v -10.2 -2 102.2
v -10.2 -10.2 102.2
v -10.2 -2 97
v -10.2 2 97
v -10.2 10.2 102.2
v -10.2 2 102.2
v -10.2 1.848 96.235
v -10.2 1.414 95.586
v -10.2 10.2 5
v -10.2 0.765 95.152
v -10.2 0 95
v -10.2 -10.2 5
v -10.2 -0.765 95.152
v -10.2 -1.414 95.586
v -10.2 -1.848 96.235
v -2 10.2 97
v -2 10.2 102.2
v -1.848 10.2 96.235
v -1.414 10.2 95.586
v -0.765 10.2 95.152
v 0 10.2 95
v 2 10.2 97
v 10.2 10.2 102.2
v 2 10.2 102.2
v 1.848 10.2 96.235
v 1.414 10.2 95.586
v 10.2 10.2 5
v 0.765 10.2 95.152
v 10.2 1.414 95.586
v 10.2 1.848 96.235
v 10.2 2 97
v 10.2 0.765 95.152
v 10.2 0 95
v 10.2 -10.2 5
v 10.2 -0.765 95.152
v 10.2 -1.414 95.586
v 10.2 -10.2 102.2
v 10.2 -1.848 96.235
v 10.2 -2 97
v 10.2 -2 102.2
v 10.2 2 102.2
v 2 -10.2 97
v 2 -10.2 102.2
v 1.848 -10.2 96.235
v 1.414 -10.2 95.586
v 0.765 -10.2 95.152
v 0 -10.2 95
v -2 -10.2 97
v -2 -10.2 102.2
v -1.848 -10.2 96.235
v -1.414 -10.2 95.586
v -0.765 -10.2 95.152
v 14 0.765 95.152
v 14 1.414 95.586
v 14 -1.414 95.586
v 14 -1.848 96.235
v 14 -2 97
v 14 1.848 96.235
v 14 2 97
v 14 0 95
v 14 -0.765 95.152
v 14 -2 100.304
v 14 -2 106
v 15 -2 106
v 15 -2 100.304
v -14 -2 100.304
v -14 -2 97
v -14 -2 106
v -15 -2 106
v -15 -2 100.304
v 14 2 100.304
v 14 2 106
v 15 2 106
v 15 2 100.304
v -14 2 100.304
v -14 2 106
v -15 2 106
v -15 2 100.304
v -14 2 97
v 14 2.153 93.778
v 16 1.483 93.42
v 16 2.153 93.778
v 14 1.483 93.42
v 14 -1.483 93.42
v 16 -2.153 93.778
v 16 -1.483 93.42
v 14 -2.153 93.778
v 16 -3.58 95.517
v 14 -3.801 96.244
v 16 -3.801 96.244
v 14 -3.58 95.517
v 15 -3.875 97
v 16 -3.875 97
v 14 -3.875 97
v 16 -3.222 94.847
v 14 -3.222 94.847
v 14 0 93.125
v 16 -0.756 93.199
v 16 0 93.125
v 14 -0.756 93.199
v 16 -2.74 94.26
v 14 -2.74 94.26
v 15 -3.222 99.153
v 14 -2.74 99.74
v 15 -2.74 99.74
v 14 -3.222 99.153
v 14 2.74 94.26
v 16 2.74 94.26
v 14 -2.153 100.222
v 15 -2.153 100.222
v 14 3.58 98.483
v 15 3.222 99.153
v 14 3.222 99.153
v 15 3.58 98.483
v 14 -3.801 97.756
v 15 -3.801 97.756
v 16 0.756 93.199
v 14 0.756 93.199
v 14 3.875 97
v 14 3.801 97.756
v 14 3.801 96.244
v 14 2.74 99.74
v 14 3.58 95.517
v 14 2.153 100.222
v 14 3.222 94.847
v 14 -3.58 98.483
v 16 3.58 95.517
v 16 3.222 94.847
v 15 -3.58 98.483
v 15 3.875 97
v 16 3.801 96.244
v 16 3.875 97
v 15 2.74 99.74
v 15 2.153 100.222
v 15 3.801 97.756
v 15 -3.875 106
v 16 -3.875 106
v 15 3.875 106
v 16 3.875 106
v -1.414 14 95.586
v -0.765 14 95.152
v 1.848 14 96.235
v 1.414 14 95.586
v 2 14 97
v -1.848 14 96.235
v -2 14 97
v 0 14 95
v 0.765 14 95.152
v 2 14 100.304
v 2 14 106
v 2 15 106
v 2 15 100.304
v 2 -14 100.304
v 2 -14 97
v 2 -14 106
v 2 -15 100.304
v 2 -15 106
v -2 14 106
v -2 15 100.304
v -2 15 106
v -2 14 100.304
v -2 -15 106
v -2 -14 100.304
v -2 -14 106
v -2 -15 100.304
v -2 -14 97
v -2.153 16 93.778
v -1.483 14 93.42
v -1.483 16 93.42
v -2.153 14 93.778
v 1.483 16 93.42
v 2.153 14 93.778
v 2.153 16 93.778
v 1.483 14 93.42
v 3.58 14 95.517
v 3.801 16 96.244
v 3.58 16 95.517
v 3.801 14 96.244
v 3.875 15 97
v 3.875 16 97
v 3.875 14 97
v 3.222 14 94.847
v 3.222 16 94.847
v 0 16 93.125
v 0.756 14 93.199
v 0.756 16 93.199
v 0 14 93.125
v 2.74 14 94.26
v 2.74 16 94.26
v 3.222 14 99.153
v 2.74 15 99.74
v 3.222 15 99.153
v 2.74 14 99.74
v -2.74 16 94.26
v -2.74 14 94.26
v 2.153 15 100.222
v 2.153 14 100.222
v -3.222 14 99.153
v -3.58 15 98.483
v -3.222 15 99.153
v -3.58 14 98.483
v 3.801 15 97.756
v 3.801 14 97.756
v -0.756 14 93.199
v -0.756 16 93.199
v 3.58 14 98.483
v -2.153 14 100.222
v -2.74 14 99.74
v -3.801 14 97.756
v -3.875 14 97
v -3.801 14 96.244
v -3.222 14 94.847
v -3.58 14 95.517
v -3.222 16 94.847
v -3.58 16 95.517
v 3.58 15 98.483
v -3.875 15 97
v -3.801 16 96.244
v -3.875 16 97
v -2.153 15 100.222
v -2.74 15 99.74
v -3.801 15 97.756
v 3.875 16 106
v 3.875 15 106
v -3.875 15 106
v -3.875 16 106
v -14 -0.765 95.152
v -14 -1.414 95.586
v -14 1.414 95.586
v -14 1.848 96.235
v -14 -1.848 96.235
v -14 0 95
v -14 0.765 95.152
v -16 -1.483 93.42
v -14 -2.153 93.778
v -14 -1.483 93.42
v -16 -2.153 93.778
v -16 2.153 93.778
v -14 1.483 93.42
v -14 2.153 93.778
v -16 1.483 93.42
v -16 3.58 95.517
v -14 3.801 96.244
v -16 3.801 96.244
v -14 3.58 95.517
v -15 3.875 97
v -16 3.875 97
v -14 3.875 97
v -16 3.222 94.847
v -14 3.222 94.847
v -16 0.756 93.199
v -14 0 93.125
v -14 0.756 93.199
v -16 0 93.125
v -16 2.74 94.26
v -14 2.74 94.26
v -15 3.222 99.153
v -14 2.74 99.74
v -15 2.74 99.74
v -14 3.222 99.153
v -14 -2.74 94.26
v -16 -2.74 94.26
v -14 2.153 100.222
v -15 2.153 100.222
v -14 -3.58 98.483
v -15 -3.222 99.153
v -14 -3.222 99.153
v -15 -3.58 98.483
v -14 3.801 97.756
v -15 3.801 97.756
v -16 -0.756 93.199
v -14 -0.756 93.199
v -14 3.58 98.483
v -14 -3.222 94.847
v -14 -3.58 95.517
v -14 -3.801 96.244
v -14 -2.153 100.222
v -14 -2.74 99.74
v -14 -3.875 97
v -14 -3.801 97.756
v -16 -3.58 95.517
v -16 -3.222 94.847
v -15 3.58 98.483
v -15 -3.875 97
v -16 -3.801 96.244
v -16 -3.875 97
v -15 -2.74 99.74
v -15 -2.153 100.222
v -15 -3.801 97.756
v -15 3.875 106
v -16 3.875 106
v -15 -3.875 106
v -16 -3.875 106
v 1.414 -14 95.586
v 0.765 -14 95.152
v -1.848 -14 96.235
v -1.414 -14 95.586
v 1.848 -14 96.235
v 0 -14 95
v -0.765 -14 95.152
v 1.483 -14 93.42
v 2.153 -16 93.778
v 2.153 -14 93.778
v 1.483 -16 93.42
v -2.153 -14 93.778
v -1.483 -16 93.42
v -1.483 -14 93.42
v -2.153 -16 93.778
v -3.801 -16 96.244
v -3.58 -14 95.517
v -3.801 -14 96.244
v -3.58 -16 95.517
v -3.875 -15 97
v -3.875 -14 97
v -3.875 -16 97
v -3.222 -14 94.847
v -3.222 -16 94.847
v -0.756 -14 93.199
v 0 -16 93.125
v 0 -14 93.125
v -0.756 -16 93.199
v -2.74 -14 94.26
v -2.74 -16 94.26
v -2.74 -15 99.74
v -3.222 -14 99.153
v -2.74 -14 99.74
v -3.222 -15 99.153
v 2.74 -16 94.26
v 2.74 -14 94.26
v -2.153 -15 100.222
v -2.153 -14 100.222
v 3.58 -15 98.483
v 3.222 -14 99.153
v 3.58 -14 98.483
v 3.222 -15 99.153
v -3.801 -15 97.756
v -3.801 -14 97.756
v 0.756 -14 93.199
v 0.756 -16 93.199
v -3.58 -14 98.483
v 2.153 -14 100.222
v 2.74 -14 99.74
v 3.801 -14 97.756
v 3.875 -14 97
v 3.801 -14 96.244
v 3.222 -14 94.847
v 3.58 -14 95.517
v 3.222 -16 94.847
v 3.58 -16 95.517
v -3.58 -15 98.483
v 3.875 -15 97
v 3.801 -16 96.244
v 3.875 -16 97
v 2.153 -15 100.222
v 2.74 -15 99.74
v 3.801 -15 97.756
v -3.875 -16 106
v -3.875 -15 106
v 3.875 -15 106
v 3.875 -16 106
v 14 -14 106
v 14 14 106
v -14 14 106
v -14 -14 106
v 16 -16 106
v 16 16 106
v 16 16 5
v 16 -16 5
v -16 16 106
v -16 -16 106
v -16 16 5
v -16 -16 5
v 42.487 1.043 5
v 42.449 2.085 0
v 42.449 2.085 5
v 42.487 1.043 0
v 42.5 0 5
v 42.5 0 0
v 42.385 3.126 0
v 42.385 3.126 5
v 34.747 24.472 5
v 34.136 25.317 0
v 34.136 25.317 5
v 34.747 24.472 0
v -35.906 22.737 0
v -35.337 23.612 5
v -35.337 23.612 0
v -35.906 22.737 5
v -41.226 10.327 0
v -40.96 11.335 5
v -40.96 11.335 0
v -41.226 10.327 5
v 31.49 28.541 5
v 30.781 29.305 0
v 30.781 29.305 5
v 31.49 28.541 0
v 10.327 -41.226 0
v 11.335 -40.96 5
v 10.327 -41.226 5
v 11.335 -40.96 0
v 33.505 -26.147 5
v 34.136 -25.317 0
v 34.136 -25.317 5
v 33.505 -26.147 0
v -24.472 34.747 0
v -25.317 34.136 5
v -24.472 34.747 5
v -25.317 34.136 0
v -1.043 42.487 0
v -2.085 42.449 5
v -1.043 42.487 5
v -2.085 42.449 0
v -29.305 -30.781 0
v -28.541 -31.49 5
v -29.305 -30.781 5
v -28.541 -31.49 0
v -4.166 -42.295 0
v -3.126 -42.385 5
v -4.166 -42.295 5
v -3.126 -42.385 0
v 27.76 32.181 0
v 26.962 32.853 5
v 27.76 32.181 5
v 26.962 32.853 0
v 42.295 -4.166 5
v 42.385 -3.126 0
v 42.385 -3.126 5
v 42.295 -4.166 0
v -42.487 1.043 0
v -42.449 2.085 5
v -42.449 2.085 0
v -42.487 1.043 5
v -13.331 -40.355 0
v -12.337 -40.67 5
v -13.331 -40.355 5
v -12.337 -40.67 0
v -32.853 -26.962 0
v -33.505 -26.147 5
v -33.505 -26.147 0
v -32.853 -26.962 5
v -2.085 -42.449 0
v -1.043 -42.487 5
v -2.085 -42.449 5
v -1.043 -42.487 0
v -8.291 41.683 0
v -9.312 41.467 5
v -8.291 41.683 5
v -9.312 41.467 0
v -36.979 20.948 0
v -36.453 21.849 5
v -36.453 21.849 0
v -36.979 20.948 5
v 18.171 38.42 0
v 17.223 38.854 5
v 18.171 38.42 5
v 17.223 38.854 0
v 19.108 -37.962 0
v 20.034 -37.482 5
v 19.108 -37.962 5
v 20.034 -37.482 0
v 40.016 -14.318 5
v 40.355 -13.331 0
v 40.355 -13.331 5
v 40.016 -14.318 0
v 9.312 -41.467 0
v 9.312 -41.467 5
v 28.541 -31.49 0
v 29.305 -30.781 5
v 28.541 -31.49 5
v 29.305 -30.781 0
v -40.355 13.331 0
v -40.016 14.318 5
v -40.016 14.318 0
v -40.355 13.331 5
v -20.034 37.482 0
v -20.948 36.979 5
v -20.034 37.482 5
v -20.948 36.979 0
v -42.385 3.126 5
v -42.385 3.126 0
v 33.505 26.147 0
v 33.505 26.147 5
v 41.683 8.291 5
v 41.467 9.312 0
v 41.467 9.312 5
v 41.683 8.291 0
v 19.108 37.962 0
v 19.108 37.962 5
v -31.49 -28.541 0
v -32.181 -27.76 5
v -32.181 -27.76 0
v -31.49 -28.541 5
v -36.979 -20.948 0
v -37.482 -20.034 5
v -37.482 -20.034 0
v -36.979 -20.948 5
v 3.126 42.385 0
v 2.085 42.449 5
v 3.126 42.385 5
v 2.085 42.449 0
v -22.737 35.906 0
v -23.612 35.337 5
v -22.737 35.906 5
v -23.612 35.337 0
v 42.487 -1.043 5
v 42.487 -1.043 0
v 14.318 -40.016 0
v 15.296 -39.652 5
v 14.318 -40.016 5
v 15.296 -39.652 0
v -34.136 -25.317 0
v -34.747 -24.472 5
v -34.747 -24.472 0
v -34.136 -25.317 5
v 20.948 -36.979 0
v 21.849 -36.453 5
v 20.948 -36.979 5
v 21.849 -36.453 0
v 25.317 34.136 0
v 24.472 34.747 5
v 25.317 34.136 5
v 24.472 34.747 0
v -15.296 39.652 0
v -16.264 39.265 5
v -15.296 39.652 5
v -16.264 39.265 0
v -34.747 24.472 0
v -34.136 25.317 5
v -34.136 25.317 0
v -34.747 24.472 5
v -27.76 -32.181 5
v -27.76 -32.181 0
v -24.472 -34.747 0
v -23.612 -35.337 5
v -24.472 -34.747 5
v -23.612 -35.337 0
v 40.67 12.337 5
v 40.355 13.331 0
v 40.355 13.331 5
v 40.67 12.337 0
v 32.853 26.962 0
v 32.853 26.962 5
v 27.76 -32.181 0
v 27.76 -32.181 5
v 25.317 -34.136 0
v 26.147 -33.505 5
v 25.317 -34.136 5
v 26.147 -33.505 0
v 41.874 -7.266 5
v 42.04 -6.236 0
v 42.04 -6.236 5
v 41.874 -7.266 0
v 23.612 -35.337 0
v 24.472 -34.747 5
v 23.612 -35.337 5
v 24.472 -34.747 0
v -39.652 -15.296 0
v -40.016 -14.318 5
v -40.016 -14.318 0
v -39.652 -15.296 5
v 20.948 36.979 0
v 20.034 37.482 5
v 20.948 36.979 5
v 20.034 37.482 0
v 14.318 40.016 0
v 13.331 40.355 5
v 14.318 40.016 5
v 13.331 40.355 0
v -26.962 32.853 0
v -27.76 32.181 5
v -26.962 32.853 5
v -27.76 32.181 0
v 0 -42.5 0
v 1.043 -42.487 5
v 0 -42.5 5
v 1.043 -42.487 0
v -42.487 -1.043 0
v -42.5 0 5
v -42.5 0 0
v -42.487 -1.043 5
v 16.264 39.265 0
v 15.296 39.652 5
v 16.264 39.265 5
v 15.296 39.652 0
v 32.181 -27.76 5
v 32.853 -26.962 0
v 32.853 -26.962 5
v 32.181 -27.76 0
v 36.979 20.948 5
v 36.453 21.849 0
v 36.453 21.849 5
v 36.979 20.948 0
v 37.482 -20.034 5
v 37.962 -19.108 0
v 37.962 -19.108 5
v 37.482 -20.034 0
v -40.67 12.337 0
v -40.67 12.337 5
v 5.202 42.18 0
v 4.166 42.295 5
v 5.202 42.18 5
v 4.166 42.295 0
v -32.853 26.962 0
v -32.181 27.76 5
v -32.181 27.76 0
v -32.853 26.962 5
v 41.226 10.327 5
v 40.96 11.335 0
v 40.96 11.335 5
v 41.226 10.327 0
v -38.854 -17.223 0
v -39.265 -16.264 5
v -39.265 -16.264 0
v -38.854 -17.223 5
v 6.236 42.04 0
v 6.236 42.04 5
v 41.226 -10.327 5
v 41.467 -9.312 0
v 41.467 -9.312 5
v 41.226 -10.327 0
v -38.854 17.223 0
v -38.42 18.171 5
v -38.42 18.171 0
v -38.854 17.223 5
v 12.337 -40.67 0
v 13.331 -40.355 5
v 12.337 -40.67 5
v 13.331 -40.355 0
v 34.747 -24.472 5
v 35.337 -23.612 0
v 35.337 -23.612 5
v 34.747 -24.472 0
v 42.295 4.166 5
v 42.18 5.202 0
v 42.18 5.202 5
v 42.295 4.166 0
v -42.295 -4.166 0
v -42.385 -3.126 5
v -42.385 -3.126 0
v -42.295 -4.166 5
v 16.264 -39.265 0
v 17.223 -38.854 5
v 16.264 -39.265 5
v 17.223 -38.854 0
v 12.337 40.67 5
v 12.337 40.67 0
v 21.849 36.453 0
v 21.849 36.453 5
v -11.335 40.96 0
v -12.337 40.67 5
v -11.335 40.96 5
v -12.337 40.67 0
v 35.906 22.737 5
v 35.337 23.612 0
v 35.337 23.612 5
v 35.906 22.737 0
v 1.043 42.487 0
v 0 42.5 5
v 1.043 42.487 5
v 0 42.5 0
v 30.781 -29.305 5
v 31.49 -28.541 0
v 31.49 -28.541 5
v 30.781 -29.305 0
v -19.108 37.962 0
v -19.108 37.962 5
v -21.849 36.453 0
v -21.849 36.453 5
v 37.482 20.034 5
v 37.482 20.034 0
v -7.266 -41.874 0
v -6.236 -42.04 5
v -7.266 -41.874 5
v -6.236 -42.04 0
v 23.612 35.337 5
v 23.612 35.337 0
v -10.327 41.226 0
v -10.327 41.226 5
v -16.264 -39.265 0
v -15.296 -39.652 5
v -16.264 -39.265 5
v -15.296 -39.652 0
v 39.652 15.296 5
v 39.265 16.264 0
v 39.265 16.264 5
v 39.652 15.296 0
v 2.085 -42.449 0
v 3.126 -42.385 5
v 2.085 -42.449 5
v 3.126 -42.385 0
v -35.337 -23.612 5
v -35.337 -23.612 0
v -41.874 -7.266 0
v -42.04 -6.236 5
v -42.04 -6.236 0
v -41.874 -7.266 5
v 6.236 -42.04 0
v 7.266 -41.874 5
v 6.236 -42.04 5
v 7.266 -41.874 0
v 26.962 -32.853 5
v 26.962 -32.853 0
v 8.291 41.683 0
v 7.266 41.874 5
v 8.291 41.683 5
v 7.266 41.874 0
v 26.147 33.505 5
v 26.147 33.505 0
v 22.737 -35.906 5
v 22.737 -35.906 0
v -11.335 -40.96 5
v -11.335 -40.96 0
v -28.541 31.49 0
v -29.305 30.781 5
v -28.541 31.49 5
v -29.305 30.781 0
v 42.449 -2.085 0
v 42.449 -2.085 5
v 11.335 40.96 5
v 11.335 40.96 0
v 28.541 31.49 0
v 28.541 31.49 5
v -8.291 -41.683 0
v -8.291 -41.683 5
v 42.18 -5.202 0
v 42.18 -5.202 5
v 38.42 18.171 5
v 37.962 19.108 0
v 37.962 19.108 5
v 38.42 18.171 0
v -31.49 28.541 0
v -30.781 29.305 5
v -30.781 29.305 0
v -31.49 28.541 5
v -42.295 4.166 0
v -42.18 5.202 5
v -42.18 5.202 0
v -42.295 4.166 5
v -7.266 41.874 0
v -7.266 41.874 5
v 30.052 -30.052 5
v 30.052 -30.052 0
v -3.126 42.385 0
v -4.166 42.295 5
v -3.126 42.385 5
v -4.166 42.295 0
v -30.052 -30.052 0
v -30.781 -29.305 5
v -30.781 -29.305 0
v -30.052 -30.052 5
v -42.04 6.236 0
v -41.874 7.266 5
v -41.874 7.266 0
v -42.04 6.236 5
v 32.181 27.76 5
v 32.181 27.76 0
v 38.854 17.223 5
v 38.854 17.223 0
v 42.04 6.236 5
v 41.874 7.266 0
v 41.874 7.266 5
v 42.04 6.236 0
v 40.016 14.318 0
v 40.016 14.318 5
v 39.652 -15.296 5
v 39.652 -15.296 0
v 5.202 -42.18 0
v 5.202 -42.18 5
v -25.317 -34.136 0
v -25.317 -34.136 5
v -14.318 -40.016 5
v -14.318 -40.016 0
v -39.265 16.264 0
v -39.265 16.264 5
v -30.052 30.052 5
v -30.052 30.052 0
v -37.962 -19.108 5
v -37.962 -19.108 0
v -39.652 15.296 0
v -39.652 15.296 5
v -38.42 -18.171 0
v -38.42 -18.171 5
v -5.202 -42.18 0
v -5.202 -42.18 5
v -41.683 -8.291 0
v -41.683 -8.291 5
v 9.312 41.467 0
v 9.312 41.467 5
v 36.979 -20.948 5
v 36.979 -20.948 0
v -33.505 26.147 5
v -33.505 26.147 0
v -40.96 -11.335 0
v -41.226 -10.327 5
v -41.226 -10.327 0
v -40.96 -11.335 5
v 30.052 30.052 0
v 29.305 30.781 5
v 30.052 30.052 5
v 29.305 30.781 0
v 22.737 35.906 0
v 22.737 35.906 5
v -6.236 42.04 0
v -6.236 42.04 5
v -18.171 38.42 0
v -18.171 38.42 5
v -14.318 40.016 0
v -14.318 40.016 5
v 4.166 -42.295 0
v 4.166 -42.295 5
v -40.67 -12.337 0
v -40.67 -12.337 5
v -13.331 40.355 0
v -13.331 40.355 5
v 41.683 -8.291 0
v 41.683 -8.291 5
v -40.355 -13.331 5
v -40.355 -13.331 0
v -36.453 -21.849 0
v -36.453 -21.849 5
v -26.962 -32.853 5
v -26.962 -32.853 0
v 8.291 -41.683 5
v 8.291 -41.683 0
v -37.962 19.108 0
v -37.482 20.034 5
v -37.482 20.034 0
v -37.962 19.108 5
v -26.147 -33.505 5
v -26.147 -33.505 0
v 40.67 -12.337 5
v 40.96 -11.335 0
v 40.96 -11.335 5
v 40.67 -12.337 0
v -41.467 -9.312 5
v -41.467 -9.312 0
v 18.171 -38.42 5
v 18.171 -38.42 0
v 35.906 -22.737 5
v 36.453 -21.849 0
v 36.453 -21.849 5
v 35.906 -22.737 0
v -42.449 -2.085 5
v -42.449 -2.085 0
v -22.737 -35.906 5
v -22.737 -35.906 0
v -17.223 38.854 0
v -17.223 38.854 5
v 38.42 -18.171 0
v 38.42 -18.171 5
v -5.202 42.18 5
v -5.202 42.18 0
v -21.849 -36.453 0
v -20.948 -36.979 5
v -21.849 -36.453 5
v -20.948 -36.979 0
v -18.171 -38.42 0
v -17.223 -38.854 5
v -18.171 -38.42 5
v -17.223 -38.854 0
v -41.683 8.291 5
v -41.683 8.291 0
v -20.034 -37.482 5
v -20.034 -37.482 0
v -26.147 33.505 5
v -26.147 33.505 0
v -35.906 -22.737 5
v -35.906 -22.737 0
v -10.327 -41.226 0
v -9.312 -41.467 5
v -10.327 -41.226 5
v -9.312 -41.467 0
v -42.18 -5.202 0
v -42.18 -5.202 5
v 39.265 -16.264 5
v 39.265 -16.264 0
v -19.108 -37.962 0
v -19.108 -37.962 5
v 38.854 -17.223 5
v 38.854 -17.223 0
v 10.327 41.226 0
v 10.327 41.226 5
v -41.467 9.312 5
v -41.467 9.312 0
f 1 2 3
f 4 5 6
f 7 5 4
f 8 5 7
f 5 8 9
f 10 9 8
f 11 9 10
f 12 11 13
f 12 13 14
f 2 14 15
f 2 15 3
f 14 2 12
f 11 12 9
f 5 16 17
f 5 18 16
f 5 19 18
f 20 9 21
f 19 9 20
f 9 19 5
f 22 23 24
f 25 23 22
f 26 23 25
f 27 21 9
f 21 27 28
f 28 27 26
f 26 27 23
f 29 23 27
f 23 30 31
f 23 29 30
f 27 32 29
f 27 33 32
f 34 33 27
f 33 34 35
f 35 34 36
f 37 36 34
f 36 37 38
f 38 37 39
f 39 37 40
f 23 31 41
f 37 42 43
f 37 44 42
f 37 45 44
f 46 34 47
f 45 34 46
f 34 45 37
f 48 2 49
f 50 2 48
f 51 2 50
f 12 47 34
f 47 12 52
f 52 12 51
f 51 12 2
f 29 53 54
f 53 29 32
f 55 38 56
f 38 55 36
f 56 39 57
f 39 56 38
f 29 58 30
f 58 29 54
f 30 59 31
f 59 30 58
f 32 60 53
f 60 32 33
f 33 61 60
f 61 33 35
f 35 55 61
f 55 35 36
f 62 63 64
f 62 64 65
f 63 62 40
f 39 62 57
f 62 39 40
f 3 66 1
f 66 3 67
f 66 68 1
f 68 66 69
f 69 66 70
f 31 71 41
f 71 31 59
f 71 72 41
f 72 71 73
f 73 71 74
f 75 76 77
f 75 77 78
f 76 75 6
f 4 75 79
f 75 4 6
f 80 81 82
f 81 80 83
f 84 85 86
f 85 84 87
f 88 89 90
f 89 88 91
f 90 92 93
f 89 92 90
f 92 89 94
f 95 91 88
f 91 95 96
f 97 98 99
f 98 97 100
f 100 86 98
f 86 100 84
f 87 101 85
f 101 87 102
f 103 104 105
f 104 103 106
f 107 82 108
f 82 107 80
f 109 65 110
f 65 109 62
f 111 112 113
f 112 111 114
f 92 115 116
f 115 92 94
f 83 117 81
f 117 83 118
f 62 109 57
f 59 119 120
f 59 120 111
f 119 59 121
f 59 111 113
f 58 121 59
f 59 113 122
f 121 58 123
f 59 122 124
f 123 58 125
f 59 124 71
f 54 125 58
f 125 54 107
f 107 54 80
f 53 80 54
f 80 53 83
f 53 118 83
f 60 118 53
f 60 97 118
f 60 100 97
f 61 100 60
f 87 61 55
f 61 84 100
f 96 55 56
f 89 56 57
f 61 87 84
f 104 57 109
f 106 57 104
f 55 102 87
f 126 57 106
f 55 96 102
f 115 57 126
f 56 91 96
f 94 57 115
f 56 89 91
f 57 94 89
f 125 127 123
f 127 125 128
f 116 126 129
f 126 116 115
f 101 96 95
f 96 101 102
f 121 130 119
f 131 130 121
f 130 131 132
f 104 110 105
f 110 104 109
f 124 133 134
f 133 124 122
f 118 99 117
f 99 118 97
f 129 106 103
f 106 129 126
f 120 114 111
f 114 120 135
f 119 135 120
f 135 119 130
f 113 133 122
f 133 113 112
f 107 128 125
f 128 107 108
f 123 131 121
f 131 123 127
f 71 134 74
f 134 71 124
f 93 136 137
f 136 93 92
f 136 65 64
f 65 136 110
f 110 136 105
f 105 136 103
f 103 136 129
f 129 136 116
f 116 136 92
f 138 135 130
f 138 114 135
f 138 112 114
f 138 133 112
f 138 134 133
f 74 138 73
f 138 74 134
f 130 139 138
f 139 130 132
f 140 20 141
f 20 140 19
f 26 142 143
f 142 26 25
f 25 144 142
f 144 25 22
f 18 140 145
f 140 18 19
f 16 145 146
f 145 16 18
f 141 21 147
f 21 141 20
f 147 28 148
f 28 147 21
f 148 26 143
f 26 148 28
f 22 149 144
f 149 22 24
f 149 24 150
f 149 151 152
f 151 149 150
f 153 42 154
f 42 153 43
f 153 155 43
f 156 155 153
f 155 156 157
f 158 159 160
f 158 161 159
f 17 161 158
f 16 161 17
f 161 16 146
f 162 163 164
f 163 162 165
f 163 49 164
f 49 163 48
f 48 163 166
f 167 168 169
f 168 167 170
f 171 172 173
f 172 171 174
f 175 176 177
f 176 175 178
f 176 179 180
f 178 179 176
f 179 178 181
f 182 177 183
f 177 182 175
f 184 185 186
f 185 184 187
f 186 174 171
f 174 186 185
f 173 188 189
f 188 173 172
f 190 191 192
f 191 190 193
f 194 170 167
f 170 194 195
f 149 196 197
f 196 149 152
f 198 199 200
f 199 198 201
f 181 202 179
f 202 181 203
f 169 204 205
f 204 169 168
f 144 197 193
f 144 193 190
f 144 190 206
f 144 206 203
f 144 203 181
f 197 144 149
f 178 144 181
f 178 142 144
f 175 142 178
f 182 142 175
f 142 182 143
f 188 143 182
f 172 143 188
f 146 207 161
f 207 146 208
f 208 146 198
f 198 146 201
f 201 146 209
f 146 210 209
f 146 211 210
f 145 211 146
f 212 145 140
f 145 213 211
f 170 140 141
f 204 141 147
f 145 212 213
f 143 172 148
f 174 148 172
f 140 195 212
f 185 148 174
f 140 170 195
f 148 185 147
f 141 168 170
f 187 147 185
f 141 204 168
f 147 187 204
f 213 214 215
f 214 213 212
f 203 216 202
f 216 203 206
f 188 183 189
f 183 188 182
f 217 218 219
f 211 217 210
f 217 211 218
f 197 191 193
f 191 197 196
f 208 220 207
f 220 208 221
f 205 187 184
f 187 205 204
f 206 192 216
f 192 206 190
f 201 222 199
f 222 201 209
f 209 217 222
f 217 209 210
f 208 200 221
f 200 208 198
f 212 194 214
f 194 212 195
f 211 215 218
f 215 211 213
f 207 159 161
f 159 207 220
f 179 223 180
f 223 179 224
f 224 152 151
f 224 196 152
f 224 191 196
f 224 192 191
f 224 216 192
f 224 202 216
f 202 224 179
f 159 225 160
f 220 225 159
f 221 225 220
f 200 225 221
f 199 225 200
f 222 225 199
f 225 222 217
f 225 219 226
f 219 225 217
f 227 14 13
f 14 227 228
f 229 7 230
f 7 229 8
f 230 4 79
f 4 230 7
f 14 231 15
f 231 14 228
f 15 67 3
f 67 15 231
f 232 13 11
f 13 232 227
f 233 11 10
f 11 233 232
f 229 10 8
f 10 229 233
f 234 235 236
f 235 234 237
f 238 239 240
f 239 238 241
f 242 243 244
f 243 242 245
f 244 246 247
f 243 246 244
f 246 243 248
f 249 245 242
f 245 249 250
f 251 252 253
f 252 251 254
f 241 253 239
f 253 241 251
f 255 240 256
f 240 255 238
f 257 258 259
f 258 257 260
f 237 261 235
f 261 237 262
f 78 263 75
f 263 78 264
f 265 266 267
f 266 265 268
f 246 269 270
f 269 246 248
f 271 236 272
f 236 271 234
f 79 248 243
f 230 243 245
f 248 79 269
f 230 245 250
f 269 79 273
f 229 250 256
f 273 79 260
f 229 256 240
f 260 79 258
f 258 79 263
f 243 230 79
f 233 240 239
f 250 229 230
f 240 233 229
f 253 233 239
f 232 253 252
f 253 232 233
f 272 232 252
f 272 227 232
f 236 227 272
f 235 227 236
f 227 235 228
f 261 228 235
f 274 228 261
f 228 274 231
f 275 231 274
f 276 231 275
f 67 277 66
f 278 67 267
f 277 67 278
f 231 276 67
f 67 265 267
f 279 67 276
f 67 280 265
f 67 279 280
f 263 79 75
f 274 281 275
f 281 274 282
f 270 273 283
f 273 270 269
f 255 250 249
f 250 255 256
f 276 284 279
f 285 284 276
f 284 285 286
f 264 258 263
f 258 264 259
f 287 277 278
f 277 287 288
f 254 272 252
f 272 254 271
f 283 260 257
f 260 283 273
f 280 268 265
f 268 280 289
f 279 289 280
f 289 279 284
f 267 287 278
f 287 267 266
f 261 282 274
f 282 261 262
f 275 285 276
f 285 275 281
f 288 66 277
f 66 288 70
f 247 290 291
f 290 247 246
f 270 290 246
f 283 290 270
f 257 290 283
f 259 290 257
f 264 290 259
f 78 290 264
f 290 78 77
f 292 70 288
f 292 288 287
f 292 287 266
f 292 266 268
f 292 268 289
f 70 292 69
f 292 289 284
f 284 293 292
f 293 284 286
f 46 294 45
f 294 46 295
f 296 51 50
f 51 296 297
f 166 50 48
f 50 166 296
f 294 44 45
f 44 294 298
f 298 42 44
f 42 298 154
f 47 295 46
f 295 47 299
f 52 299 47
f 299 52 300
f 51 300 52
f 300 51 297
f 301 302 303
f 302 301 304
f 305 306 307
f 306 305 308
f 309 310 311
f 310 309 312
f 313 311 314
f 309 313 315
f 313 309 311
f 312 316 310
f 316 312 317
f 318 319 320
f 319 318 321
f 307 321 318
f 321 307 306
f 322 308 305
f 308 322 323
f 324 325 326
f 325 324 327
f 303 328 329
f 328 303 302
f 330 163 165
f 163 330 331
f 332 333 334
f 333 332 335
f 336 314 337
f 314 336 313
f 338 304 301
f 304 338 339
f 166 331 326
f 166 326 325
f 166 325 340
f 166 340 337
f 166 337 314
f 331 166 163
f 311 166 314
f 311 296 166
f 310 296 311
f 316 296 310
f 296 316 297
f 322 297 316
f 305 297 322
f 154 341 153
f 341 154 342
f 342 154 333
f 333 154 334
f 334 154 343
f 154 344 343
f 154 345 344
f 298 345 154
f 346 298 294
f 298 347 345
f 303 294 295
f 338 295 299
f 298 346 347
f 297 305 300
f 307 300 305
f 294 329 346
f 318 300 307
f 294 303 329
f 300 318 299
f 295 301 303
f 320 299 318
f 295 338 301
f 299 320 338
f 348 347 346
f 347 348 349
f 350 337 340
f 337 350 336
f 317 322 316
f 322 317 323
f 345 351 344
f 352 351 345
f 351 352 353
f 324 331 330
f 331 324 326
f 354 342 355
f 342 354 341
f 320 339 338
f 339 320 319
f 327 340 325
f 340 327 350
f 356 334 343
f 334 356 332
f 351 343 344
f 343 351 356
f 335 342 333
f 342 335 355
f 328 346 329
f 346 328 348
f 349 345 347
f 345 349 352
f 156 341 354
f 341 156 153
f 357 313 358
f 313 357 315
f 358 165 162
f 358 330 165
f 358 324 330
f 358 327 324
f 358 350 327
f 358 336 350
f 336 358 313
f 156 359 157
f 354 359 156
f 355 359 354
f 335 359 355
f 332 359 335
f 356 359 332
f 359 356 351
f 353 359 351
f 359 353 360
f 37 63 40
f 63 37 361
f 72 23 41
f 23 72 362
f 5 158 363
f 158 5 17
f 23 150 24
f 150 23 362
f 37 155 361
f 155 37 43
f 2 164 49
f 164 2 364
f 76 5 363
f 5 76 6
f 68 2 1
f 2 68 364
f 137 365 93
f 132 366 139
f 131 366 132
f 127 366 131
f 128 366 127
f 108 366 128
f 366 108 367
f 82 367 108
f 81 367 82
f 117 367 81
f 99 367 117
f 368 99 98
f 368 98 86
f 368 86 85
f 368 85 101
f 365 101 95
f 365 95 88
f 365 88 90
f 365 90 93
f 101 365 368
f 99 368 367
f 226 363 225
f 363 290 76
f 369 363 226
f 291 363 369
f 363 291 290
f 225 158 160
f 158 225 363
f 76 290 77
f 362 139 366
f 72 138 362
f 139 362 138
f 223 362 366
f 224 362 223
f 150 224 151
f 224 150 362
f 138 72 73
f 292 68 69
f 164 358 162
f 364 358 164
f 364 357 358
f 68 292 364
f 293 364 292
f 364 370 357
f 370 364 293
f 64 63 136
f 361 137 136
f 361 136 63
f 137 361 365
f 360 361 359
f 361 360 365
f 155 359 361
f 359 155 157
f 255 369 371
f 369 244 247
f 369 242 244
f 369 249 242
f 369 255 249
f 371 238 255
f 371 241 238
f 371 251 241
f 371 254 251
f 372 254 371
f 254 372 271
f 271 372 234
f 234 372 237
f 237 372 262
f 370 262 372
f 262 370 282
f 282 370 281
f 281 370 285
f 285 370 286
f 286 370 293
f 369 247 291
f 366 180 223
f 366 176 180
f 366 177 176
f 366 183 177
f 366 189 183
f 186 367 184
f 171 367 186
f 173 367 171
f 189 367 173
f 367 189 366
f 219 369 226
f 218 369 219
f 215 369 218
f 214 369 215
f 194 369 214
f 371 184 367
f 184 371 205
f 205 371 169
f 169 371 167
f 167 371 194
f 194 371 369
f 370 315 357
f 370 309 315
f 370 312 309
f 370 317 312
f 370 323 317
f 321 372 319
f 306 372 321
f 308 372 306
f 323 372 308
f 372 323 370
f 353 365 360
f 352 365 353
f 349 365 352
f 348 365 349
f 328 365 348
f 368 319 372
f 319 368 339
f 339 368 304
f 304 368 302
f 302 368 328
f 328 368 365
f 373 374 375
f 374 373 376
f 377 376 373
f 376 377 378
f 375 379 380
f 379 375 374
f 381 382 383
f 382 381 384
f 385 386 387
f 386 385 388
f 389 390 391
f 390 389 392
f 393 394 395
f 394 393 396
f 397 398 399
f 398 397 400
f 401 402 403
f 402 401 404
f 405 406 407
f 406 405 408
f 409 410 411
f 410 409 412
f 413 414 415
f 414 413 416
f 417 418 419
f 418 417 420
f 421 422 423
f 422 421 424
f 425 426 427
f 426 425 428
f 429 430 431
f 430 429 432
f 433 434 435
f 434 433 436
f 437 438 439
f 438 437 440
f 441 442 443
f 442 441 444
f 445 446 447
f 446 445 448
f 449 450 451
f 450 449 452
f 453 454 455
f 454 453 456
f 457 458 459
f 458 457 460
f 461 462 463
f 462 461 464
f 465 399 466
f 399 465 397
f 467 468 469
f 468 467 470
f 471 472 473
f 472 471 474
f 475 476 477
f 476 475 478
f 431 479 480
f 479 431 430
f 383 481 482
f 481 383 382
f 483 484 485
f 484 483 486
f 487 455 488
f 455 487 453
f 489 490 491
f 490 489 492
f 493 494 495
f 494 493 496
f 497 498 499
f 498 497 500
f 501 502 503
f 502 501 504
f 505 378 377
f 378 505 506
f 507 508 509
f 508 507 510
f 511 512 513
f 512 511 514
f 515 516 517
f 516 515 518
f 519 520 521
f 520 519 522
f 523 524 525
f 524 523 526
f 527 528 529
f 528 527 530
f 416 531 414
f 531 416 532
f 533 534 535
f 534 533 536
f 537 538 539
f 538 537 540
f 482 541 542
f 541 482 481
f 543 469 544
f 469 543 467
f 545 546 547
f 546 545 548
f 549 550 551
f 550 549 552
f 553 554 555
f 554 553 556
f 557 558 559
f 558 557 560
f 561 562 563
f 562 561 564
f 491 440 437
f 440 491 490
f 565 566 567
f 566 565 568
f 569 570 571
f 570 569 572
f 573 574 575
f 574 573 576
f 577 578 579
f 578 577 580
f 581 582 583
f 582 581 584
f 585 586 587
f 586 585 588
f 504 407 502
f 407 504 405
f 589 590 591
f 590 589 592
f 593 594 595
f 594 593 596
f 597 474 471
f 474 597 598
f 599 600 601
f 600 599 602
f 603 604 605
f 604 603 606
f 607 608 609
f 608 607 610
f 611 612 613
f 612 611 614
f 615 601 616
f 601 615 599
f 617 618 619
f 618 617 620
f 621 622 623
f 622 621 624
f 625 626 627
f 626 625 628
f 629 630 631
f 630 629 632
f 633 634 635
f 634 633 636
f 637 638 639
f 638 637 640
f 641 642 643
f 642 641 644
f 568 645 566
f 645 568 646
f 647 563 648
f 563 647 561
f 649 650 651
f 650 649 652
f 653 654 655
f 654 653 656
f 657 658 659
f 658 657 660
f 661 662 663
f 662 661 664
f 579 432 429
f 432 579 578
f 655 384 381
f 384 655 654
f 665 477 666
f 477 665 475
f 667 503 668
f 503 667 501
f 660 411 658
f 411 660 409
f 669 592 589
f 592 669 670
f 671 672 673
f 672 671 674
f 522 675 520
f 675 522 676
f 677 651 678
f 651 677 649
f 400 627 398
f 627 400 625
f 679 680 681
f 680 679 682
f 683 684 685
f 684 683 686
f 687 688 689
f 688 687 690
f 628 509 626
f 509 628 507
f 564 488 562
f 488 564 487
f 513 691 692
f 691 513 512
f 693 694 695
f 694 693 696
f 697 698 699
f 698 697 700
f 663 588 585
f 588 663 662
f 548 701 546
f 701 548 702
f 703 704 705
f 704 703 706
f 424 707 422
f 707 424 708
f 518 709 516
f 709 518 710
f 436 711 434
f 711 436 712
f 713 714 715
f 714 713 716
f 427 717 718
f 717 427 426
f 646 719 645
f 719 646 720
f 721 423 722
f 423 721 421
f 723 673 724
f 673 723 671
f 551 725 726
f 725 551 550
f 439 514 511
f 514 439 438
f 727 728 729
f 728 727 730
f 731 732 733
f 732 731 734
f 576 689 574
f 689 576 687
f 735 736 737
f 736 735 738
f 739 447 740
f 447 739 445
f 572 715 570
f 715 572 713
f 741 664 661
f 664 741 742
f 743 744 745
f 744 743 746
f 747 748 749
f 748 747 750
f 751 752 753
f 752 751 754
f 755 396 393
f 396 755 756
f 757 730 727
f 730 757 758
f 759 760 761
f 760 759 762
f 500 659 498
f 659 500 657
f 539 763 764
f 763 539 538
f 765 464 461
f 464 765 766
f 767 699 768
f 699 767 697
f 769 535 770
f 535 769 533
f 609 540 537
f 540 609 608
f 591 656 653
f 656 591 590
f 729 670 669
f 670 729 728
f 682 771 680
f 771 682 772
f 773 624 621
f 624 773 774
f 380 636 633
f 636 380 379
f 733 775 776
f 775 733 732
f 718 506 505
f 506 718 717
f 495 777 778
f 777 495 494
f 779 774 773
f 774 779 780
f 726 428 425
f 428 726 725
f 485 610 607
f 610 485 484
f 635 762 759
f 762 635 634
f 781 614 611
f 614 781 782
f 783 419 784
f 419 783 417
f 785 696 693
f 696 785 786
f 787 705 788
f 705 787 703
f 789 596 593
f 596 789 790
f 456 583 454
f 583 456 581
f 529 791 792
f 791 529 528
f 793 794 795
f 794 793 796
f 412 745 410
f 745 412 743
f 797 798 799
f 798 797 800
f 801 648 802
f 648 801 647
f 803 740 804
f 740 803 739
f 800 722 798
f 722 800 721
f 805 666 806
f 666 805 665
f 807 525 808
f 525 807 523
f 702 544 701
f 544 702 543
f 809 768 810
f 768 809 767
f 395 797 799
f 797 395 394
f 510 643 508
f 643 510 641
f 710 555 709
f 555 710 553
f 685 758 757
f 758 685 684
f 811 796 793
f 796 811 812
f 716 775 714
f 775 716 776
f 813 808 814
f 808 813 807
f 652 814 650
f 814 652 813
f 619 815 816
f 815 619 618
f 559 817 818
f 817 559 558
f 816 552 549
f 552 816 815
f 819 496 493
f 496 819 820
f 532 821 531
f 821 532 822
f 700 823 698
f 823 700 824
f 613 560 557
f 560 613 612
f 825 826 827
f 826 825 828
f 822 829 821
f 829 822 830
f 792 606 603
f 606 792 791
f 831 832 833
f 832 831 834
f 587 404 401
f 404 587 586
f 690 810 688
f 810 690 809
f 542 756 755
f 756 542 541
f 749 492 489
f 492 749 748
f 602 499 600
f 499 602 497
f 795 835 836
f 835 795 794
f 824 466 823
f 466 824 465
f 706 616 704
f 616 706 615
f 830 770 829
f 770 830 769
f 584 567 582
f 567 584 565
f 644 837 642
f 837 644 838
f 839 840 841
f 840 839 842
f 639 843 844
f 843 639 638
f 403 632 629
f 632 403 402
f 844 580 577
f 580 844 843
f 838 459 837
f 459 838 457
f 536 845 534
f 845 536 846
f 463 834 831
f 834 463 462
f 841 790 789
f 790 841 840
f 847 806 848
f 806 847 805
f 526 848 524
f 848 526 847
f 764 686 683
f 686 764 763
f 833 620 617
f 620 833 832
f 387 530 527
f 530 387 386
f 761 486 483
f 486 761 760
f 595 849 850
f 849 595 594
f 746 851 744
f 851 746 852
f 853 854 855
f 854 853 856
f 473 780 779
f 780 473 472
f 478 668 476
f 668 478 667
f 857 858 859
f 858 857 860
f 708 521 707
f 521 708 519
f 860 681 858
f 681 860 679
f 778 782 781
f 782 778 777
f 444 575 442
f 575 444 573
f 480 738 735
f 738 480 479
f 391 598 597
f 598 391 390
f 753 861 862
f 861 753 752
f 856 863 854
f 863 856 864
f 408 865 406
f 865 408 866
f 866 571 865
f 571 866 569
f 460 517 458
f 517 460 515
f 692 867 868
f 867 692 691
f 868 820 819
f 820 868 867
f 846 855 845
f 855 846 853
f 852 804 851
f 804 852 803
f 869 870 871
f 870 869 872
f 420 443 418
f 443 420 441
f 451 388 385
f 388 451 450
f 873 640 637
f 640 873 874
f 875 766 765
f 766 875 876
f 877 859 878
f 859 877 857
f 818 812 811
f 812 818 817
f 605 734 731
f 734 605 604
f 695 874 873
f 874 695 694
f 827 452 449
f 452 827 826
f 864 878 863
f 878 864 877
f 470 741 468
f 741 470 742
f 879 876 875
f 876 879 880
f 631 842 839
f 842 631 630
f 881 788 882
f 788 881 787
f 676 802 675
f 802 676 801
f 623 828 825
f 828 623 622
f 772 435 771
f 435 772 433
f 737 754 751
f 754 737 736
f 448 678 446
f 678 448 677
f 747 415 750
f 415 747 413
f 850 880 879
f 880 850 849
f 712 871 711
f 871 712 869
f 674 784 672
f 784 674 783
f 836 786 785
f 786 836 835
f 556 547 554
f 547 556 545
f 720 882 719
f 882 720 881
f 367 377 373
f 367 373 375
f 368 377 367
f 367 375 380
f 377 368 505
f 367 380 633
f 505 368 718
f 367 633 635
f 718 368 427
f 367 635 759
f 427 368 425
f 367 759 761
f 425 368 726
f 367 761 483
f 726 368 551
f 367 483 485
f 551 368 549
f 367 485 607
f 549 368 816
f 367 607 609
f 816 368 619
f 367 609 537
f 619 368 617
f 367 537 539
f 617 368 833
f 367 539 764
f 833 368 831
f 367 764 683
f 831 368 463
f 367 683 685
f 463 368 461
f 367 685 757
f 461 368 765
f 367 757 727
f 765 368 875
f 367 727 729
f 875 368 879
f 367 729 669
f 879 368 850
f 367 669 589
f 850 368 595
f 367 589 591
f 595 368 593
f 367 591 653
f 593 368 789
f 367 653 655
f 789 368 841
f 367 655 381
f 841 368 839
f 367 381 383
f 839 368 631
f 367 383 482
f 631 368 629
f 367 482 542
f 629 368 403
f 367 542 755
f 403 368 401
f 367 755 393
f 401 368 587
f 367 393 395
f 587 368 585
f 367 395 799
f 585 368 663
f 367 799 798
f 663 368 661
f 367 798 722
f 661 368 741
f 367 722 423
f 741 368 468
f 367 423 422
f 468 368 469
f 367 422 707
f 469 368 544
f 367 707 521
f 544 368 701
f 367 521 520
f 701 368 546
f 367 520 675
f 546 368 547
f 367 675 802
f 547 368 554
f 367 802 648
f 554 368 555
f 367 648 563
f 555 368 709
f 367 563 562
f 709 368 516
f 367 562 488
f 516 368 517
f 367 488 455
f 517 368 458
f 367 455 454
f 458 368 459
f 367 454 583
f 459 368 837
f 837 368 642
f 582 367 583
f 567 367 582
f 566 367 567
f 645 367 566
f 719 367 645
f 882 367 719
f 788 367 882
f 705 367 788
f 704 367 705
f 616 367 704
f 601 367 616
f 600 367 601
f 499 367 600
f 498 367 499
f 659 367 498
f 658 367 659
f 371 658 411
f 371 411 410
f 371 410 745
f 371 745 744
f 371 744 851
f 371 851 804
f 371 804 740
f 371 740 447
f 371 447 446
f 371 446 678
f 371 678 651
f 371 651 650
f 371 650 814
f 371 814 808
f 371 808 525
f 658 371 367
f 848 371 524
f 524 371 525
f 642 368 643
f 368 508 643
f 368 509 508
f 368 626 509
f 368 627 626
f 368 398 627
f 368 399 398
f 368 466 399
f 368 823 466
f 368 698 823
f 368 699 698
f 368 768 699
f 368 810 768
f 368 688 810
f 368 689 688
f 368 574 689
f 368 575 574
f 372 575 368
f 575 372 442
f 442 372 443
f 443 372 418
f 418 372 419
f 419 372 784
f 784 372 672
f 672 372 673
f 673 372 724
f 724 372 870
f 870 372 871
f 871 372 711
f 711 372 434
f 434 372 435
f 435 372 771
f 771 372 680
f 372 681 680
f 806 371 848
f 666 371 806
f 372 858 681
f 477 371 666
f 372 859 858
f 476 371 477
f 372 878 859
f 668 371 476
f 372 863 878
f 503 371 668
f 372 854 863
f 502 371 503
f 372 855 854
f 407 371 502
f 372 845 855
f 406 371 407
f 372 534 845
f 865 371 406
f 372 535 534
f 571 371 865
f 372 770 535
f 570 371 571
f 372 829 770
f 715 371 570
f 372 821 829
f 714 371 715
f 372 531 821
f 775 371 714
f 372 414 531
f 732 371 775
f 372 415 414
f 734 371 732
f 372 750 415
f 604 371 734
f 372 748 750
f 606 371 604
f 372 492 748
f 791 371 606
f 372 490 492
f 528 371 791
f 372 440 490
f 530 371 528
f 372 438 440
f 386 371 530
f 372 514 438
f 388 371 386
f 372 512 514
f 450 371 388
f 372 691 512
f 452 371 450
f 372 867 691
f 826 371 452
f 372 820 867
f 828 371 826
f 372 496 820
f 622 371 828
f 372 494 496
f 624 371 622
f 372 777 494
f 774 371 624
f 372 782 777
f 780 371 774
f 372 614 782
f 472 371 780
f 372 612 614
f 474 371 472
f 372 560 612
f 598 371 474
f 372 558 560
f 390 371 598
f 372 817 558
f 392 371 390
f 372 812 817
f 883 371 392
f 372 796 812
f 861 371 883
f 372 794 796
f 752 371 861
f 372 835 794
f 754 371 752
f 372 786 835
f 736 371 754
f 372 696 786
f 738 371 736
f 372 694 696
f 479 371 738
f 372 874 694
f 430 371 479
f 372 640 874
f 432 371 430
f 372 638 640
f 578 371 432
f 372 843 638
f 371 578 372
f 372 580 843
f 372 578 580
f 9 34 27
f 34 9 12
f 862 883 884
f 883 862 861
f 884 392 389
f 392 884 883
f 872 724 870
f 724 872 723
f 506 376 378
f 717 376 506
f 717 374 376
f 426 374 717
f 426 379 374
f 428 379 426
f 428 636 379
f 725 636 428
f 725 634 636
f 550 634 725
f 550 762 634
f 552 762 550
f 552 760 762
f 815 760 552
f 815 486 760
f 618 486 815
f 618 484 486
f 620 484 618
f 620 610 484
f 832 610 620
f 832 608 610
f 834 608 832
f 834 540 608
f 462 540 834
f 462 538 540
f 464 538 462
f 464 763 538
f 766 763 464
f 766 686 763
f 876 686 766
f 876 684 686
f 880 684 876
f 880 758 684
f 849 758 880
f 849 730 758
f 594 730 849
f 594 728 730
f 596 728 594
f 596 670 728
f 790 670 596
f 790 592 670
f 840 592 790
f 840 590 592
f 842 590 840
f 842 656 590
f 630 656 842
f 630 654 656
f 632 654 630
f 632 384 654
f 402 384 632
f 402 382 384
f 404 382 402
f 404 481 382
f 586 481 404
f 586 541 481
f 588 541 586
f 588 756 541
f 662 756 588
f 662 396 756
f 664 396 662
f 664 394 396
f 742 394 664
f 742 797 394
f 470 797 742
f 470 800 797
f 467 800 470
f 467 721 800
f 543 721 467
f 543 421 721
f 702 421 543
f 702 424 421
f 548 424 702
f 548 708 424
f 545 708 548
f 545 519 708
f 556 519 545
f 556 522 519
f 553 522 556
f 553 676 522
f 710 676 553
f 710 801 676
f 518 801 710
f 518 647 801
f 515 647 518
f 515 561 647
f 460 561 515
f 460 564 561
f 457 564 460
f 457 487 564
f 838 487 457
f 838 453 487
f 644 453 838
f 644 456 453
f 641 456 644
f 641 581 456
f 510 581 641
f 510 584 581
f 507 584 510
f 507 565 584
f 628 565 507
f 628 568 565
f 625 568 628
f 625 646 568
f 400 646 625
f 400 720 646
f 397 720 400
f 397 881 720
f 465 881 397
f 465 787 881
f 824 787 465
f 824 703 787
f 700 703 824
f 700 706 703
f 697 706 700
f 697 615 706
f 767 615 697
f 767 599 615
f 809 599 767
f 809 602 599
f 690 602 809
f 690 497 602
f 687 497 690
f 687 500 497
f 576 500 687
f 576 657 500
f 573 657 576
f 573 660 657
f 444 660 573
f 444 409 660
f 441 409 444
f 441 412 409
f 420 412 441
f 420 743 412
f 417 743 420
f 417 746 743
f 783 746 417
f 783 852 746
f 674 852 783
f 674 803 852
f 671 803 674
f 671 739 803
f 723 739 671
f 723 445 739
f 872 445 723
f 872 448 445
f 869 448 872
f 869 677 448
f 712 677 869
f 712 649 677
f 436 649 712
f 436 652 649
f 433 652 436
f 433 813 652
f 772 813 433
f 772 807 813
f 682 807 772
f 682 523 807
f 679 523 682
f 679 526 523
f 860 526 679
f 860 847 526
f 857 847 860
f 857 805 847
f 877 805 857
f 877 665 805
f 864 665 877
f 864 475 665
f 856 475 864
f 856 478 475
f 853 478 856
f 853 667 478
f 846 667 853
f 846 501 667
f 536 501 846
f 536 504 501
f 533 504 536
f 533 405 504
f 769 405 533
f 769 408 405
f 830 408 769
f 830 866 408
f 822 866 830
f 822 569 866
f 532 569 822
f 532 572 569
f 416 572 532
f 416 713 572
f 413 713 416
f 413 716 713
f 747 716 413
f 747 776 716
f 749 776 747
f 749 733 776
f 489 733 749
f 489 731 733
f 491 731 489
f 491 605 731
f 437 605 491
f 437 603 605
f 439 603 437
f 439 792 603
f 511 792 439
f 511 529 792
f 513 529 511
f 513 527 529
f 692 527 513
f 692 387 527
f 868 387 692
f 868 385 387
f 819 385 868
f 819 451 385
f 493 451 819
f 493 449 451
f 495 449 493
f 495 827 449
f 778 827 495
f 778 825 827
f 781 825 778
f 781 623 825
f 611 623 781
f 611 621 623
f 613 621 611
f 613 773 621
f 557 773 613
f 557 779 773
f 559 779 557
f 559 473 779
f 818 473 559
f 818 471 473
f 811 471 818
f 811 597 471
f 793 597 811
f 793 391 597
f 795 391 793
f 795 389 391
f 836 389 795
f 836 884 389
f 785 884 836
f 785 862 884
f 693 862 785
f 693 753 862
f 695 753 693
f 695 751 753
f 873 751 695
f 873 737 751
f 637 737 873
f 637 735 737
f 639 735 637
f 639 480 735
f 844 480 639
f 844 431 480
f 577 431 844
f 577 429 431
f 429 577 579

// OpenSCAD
difference() {
	union() {
		cylinder($fn = 256, center = true, h = 10, r = 42.5);
		translate(v = [0, 0, 36]) {
			rotate(a = -90, v = [0, 1, 0]) {

				difference() {
					union() {
						union();
						translate(v = [-70, 0, 0]) {
							rotate(a = [0, 90.0, 0.0]) {
								translate(v = [0, 0, 70.0]) {
									cube(center = true, size = [32.0000000000, 32.0000000000, 140.0]);
								}
							}
						}
						union();
					}
					union() {
						union();
						translate(v = [-70, 0, 0]) {
							rotate(a = [0, 90.0, 0.0]) {
								translate(v = [0, 0, 10]) {
									rotate(a = -90, v = [0, -1, 0]) {
										rotate(a = 90, v = [0, 0, 1]) {
											union() {
												union();
												translate(v = [0, -10, 0]) {
													rotate(a = -90, v = [1, 0, 0]) {
														polyhedron(convexity = 10, faces = [[0, 1, 4], [1, 5, 4], [1, 2, 5], [2, 6, 5], [2, 3, 6], [3, 7, 6], [3, 0, 7], [0, 4, 7], [3, 2, 1, 0], [4, 5, 6, 7]], points = [[-15.0000000000, 15.0000000000, 0.0000000000], [15.0000000000, 15.0000000000, 0.0000000000], [15.0000000000, -15.0000000000, 0.0000000000], [-15.0000000000, -15.0000000000, 0.0000000000], [0.0000000000, 0.0000000000, 15.0000000000], [0.0000000000, 0.0000000000, 15.0000000000], [0.0000000000, 0.0000000000, 15.0000000000], [0.0000000000, 0.0000000000, 15.0000000000]]);
													}
												}
												translate(v = [0, 121.0, 0]) {
													rotate(a = 180, v = [1, 0, 0]) {
														translate(v = [0, -10, 0]) {
															rotate(a = -90, v = [1, 0, 0]) {
																polyhedron(convexity = 10, faces = [[0, 1, 4], [1, 5, 4], [1, 2, 5], [2, 6, 5], [2, 3, 6], [3, 7, 6], [3, 0, 7], [0, 4, 7], [3, 2, 1, 0], [4, 5, 6, 7]], points = [[-15.0000000000, 15.0000000000, 0.0000000000], [15.0000000000, 15.0000000000, 0.0000000000], [15.0000000000, -15.0000000000, 0.0000000000], [-15.0000000000, -15.0000000000, 0.0000000000], [0.0000000000, 0.0000000000, 15.0000000000], [0.0000000000, 0.0000000000, 15.0000000000], [0.0000000000, 0.0000000000, 15.0000000000], [0.0000000000, 0.0000000000, 15.0000000000]]);
															}
														}
													}
												}
												translate(v = [0, -10, 0]) {
													rotate(a = -90, v = [1, 0, 0]) {
														union() {
															polyhedron(convexity = 10, faces = [[0, 1, 5], [1, 6, 5], [1, 2, 6], [2, 7, 6], [2, 3, 7], [3, 8, 7], [3, 4, 8], [4, 9, 8], [4, 0, 9], [0, 5, 9], [4, 3, 2, 1, 0], [5, 6, 7, 8, 9]], points = [[-10.2, 10.2, 0.0], [-10.2, 0.0, 0.0], [-4.3999999999999995, 0.0, 0.0], [-4.3999999999999995, 0.0, 0.0], [0.0, 0.0, 0.0], [-10.2, 10.2, 140.0], [-10.2, 0.0, 140.0], [-4.3999999999999995, 0.0, 140.0], [-4.3999999999999995, 0.0, 140.0], [0.0, 0.0, 140.0]]);
															mirror(v = [0, 1]) {
																polyhedron(convexity = 10, faces = [[0, 1, 5], [1, 6, 5], [1, 2, 6], [2, 7, 6], [2, 3, 7], [3, 8, 7], [3, 4, 8], [4, 9, 8], [4, 0, 9], [0, 5, 9], [4, 3, 2, 1, 0], [5, 6, 7, 8, 9]], points = [[-10.2, 10.2, 0.0], [-10.2, 0.0, 0.0], [-4.3999999999999995, 0.0, 0.0], [-4.3999999999999995, 0.0, 0.0], [0.0, 0.0, 0.0], [-10.2, 10.2, 140.0], [-10.2, 0.0, 140.0], [-4.3999999999999995, 0.0, 140.0], [-4.3999999999999995, 0.0, 140.0], [0.0, 0.0, 140.0]]);
															}
															mirror(v = [1, 1]) {
																union() {
																	polyhedron(convexity = 10, faces = [[0, 1, 5], [1, 6, 5], [1, 2, 6], [2, 7, 6], [2, 3, 7], [3, 8, 7], [3, 4, 8], [4, 9, 8], [4, 0, 9], [0, 5, 9], [4, 3, 2, 1, 0], [5, 6, 7, 8, 9]], points = [[-10.2, 10.2, 0.0], [-10.2, 0.0, 0.0], [-4.3999999999999995, 0.0, 0.0], [-4.3999999999999995, 0.0, 0.0], [0.0, 0.0, 0.0], [-10.2, 10.2, 140.0], [-10.2, 0.0, 140.0], [-4.3999999999999995, 0.0, 140.0], [-4.3999999999999995, 0.0, 140.0], [0.0, 0.0, 140.0]]);
																	mirror(v = [0, 1]) {
																		polyhedron(convexity = 10, faces = [[0, 1, 5], [1, 6, 5], [1, 2, 6], [2, 7, 6], [2, 3, 7], [3, 8, 7], [3, 4, 8], [4, 9, 8], [4, 0, 9], [0, 5, 9], [4, 3, 2, 1, 0], [5, 6, 7, 8, 9]], points = [[-10.2, 10.2, 0.0], [-10.2, 0.0, 0.0], [-4.3999999999999995, 0.0, 0.0], [-4.3999999999999995, 0.0, 0.0], [0.0, 0.0, 0.0], [-10.2, 10.2, 140.0], [-10.2, 0.0, 140.0], [-4.3999999999999995, 0.0, 140.0], [-4.3999999999999995, 0.0, 140.0], [0.0, 0.0, 140.0]]);
																	}
																}
															}
															mirror(v = [1, -1]) {
																union() {
																	polyhedron(convexity = 10, faces = [[0, 1, 5], [1, 6, 5], [1, 2, 6], [2, 7, 6], [2, 3, 7], [3, 8, 7], [3, 4, 8], [4, 9, 8], [4, 0, 9], [0, 5, 9], [4, 3, 2, 1, 0], [5, 6, 7, 8, 9]], points = [[-10.2, 10.2, 0.0], [-10.2, 0.0, 0.0], [-4.3999999999999995, 0.0, 0.0], [-4.3999999999999995, 0.0, 0.0], [0.0, 0.0, 0.0], [-10.2, 10.2, 140.0], [-10.2, 0.0, 140.0], [-4.3999999999999995, 0.0, 140.0], [-4.3999999999999995, 0.0, 140.0], [0.0, 0.0, 140.0]]);
																	mirror(v = [0, 1]) {
																		polyhedron(convexity = 10, faces = [[0, 1, 5], [1, 6, 5], [1, 2, 6], [2, 7, 6], [2, 3, 7], [3, 8, 7], [3, 4, 8], [4, 9, 8], [4, 0, 9], [0, 5, 9], [4, 3, 2, 1, 0], [5, 6, 7, 8, 9]], points = [[-10.2, 10.2, 0.0], [-10.2, 0.0, 0.0], [-4.3999999999999995, 0.0, 0.0], [-4.3999999999999995, 0.0, 0.0], [0.0, 0.0, 0.0], [-10.2, 10.2, 140.0], [-10.2, 0.0, 140.0], [-4.3999999999999995, 0.0, 140.0], [-4.3999999999999995, 0.0, 140.0], [0.0, 0.0, 140.0]]);
																	}
																	mirror(v = [1, 1]) {
																		union() {
																			polyhedron(convexity = 10, faces = [[0, 1, 5], [1, 6, 5], [1, 2, 6], [2, 7, 6], [2, 3, 7], [3, 8, 7], [3, 4, 8], [4, 9, 8], [4, 0, 9], [0, 5, 9], [4, 3, 2, 1, 0], [5, 6, 7, 8, 9]], points = [[-10.2, 10.2, 0.0], [-10.2, 0.0, 0.0], [-4.3999999999999995, 0.0, 0.0], [-4.3999999999999995, 0.0, 0.0], [0.0, 0.0, 0.0], [-10.2, 10.2, 140.0], [-10.2, 0.0, 140.0], [-4.3999999999999995, 0.0, 140.0], [-4.3999999999999995, 0.0, 140.0], [0.0, 0.0, 140.0]]);
																			mirror(v = [0, 1]) {
																				polyhedron(convexity = 10, faces = [[0, 1, 5], [1, 6, 5], [1, 2, 6], [2, 7, 6], [2, 3, 7], [3, 8, 7], [3, 4, 8], [4, 9, 8], [4, 0, 9], [0, 5, 9], [4, 3, 2, 1, 0], [5, 6, 7, 8, 9]], points = [[-10.2, 10.2, 0.0], [-10.2, 0.0, 0.0], [-4.3999999999999995, 0.0, 0.0], [-4.3999999999999995, 0.0, 0.0], [0.0, 0.0, 0.0], [-10.2, 10.2, 140.0], [-10.2, 0.0, 140.0], [-4.3999999999999995, 0.0, 140.0], [-4.3999999999999995, 0.0, 140.0], [0.0, 0.0, 140.0]]);
																			}
																		}
																	}
																}
															}
														}
													}
												}
												union() {
													union();
													translate(v = [0, 121.0, 0]) {
														rotate(a = 180, v = [1, 0, 0]) {
															rotate(a = 180, v = [0, 1, 0]) {
																union() {
																	translate(v = [0, 0, 14]) {
																		cylinder($fn = 32, h = 4, r = 3.8750000000);
																	}
																	translate(v = [-3.8750000000, -12, 15]) {
																		cube(size = [7.7500000000, 12, 4]);
																	}
																	union() {
																		cylinder($fn = 16, h = 19, r = 2.0000000000);
																		translate(v = [-2.0000000000, -12, 0]) {
																			cube(size = [4, 12, 19]);
																		}
																	}
																	rotate(a = -90, v = [0, 1, 0]) {
																		polyhedron(convexity = 10, faces = [[0, 1, 3], [1, 4, 3], [1, 2, 4], [2, 5, 4], [2, 0, 5], [0, 3, 5], [2, 1, 0], [3, 4, 5]], points = [[0.0000000000, -10.0000000000, 0.0000000000], [10.1000000000, -10.0000000000, 10.1000000000], [10.1000000000, -10.0000000000, -10.1000000000], [0.0000000000, 12.0000000000, 0.0000000000], [10.1000000000, 12.0000000000, 10.1000000000], [10.1000000000, 12.0000000000, -10.1000000000]]);
																	}
																}
															}
														}
													}
													translate(v = [0, 121.0, 0]) {
														rotate(a = 180, v = [1, 0, 0]) {
															rotate(a = 90, v = [0, 1, 0]) {
																union() {
																	translate(v = [0, 0, 14]) {
																		cylinder($fn = 32, h = 4, r = 3.8750000000);
																	}
																	translate(v = [-3.8750000000, -12, 15]) {
																		cube(size = [7.7500000000, 12, 4]);
																	}
																	union() {
																		cylinder($fn = 16, h = 19, r = 2.0000000000);
																		translate(v = [-2.0000000000, -12, 0]) {
																			cube(size = [4, 12, 19]);
																		}
																	}
																	rotate(a = -90, v = [0, 1, 0]) {
																		polyhedron(convexity = 10, faces = [[0, 1, 3], [1, 4, 3], [1, 2, 4], [2, 5, 4], [2, 0, 5], [0, 3, 5], [2, 1, 0], [3, 4, 5]], points = [[0.0000000000, -10.0000000000, 0.0000000000], [10.1000000000, -10.0000000000, 10.1000000000], [10.1000000000, -10.0000000000, -10.1000000000], [0.0000000000, 12.0000000000, 0.0000000000], [10.1000000000, 12.0000000000, 10.1000000000], [10.1000000000, 12.0000000000, -10.1000000000]]);
																	}
																}
															}
														}
													}
													translate(v = [0, 121.0, 0]) {
														rotate(a = 180, v = [1, 0, 0]) {
															union() {
																translate(v = [0, 0, 14]) {
																	cylinder($fn = 32, h = 4, r = 3.8750000000);
																}
																translate(v = [-3.8750000000, -12, 15]) {
																	cube(size = [7.7500000000, 12, 4]);
																}
																union() {
																	cylinder($fn = 16, h = 19, r = 2.0000000000);
																	translate(v = [-2.0000000000, -12, 0]) {
																		cube(size = [4, 12, 19]);
																	}
																}
																rotate(a = -90, v = [0, 1, 0]) {
																	polyhedron(convexity = 10, faces = [[0, 1, 3], [1, 4, 3], [1, 2, 4], [2, 5, 4], [2, 0, 5], [0, 3, 5], [2, 1, 0], [3, 4, 5]], points = [[0.0000000000, -10.0000000000, 0.0000000000], [10.1000000000, -10.0000000000, 10.1000000000], [10.1000000000, -10.0000000000, -10.1000000000], [0.0000000000, 12.0000000000, 0.0000000000], [10.1000000000, 12.0000000000, 10.1000000000], [10.1000000000, 12.0000000000, -10.1000000000]]);
																}
															}
														}
													}
													translate(v = [0, 121.0, 0]) {
														rotate(a = 180, v = [1, 0, 0]) {
															rotate(a = 270, v = [0, 1, 0]) {
																union() {
																	translate(v = [0, 0, 14]) {
																		cylinder($fn = 32, h = 4, r = 3.8750000000);
																	}
																	translate(v = [-3.8750000000, -12, 15]) {
																		cube(size = [7.7500000000, 12, 4]);
																	}
																	union() {
																		cylinder($fn = 16, h = 19, r = 2.0000000000);
																		translate(v = [-2.0000000000, -12, 0]) {
																			cube(size = [4, 12, 19]);
																		}
																	}
																	rotate(a = -90, v = [0, 1, 0]) {
																		polyhedron(convexity = 10, faces = [[0, 1, 3], [1, 4, 3], [1, 2, 4], [2, 5, 4], [2, 0, 5], [0, 3, 5], [2, 1, 0], [3, 4, 5]], points = [[0.0000000000, -10.0000000000, 0.0000000000], [10.1000000000, -10.0000000000, 10.1000000000], [10.1000000000, -10.0000000000, -10.1000000000], [0.0000000000, 12.0000000000, 0.0000000000], [10.1000000000, 12.0000000000, 10.1000000000], [10.1000000000, 12.0000000000, -10.1000000000]]);
																	}
																}
															}
														}
													}
												}
											}
										}
									}
								}
							}
						}
					}
				}}
		}
	}
	translate(v = [0, 0, -150]) {
		cube(center = true, size = [300, 300, 300]);
	}
}
